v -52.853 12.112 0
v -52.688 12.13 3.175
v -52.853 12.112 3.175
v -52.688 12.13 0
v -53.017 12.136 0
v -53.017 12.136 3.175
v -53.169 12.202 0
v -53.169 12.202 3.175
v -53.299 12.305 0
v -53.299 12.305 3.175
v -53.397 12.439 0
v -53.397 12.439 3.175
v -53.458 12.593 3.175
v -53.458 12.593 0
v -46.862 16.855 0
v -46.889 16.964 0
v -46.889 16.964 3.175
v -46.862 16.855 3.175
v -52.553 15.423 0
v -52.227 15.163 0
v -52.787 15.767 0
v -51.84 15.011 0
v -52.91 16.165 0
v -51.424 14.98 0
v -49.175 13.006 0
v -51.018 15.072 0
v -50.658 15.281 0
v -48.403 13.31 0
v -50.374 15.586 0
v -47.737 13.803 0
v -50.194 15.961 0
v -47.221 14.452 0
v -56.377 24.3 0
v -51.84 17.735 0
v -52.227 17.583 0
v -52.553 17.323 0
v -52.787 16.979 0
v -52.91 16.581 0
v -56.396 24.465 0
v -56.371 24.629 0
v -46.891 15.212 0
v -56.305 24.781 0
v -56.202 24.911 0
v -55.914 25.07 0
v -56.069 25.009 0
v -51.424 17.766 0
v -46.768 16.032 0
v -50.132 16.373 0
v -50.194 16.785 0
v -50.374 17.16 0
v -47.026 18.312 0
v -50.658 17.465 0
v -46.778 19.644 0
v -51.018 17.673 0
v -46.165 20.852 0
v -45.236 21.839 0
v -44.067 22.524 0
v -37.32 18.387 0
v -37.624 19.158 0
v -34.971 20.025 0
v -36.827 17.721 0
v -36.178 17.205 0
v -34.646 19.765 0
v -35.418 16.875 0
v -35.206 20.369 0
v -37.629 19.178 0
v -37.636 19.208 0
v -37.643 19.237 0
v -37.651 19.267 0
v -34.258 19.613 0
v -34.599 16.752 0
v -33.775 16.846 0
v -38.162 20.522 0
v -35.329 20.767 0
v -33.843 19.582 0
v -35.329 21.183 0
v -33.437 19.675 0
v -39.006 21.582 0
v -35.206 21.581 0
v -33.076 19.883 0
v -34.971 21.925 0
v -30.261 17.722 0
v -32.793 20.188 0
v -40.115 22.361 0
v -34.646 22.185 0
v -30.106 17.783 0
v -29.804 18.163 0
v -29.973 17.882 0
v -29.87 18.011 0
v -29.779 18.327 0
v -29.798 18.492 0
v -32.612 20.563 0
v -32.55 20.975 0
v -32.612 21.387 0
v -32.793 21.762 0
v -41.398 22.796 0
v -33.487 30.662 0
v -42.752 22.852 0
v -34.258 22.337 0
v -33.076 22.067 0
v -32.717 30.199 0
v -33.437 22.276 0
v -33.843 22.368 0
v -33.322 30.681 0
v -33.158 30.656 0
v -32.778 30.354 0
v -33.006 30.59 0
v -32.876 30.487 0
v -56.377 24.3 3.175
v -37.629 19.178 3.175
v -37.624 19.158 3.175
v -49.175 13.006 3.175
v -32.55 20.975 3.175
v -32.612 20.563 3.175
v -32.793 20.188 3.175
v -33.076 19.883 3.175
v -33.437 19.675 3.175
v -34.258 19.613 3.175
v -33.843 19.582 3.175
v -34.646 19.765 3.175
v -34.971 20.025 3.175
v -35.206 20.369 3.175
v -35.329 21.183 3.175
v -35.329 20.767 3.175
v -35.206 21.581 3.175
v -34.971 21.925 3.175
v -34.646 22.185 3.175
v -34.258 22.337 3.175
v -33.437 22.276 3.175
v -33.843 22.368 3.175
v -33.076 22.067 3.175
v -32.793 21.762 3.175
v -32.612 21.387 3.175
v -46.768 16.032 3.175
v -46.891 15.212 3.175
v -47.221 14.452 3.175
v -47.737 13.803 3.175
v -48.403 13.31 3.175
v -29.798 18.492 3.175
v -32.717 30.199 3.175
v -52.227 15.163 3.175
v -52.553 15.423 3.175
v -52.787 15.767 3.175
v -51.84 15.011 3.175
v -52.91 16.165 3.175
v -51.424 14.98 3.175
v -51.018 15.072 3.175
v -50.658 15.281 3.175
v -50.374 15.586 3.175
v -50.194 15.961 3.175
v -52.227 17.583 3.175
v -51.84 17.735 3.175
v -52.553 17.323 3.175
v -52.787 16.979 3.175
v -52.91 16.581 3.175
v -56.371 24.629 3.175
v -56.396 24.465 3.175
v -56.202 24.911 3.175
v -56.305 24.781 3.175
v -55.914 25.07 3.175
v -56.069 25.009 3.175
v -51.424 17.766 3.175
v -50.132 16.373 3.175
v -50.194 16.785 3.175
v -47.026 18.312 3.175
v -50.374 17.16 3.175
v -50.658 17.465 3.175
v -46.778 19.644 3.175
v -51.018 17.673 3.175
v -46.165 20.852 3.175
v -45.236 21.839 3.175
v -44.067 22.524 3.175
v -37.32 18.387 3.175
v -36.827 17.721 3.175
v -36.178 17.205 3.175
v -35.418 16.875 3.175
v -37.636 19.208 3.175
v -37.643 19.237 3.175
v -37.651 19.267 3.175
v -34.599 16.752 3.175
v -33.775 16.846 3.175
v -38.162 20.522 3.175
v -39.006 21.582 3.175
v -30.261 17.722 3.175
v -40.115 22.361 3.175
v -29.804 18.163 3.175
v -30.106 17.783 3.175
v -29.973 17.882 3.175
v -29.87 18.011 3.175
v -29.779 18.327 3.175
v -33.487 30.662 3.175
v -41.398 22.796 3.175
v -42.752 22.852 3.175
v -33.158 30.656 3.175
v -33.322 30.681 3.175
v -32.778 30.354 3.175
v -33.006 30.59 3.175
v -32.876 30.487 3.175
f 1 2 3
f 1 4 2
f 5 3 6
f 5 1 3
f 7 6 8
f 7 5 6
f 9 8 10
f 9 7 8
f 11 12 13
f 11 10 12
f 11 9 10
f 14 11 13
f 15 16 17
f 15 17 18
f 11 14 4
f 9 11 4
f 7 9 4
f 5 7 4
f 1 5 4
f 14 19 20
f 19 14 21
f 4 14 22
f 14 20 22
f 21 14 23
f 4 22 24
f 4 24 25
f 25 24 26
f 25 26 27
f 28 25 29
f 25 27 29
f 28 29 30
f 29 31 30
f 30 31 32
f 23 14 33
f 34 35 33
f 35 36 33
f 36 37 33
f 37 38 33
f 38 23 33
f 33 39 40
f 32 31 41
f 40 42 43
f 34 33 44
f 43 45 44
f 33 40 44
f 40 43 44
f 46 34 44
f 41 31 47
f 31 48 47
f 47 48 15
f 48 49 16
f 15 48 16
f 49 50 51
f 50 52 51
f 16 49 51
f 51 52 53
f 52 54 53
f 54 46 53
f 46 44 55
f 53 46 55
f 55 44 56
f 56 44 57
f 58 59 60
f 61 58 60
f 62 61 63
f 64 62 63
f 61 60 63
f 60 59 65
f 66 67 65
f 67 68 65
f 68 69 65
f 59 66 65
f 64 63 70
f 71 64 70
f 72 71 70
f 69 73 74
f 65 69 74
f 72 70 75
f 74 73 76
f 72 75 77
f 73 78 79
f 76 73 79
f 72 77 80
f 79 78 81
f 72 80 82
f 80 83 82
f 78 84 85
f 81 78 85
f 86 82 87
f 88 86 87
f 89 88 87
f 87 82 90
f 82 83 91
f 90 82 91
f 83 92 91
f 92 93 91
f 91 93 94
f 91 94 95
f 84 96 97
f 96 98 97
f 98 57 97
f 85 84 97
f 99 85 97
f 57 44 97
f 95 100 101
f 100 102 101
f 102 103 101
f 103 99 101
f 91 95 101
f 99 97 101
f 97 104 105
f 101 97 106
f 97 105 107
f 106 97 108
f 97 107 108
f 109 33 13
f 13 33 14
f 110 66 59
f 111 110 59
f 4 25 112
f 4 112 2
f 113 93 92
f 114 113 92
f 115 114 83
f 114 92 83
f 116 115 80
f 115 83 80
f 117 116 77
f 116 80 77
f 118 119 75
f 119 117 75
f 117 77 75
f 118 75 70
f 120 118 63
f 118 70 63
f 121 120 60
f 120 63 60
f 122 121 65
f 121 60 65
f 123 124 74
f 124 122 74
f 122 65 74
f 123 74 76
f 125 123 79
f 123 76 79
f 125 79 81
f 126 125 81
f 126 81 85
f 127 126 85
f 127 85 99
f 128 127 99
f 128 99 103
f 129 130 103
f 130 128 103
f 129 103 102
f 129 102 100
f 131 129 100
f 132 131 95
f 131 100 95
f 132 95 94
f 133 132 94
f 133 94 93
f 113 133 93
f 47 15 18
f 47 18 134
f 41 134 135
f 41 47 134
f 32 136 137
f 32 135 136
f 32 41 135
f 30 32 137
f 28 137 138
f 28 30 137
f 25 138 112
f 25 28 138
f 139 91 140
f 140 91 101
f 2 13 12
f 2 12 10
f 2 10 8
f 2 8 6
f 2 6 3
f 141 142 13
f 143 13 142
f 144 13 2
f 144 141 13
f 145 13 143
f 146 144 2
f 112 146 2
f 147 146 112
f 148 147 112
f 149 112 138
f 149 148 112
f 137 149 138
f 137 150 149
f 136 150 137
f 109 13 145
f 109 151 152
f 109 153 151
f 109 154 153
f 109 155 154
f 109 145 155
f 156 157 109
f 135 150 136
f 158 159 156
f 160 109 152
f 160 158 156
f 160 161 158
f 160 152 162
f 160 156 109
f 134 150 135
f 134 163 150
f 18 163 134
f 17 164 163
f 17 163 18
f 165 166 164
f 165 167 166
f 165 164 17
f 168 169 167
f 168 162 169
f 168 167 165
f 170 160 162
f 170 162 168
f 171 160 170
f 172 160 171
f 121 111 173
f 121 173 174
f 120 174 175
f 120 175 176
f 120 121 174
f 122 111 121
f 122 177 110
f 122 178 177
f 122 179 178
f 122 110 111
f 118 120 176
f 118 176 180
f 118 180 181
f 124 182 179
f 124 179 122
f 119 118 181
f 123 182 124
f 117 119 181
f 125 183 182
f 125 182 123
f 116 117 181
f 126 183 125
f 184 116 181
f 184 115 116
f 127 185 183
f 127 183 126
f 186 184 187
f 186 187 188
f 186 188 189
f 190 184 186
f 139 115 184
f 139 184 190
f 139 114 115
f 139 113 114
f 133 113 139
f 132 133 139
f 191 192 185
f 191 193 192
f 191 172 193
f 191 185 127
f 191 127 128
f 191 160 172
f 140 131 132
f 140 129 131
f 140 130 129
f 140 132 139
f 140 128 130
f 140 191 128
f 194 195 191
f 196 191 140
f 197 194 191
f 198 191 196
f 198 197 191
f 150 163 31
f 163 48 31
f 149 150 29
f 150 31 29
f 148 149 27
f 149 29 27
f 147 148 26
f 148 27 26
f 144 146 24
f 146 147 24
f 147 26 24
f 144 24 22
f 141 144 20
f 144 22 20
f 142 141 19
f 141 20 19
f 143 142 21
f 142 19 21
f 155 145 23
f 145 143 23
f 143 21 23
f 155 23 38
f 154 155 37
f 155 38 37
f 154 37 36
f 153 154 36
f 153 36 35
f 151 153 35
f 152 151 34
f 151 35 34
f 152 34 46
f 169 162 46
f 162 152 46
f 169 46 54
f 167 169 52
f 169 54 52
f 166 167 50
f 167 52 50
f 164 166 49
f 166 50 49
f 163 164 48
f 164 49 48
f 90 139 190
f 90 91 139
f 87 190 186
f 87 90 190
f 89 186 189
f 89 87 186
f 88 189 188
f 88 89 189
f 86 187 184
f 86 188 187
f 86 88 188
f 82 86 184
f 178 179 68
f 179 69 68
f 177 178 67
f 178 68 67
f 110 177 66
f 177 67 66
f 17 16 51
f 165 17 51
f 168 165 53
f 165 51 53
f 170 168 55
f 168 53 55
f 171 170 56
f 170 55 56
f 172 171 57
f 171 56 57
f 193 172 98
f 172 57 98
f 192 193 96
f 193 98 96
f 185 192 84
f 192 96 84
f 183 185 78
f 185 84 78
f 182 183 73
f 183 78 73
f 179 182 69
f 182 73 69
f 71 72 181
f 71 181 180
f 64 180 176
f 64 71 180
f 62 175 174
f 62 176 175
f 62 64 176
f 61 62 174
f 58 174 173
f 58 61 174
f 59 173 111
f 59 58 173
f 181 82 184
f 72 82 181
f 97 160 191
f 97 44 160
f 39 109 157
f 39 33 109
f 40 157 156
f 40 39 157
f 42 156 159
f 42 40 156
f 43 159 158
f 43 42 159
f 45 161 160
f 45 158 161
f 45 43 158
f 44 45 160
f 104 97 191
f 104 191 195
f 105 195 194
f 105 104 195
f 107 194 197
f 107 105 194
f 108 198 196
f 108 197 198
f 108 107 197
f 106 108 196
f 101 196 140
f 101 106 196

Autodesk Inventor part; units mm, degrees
ref_plane "YZ Plane" through (0, 0, 0) normal (1, 0, 0) x (0, 1, 0)
ref_plane "XZ Plane" through (0, 0, 0) normal (0, 1, 0) x (-1, 0, 0)
ref_plane "XY Plane" through (0, 0, 0) normal (0, 0, 1) x (1, 0, 0)
ref_plane "Work Plane1" through (0, 0, 0) normal (0, 0, 1) x (1, 0, 0)
sketch "Sketch1" plane through (0, 0, 0) normal (0, 0, 1) x (1, 0, 0)
  circle A0 centre (-51.5287, 16.3728) radius 1.397 projected
  circle A1 centre (-33.9472, 20.9752) radius 1.397 projected
  line L0 (-56.5305, 24.9164) -> (-45.777, -18.2132) projected
  line L1 (-22.1173, -12.3142) -> (-32.8708, 30.8155) projected
  line L2 (-55.9143, 25.0701) -> (-33.4869, 30.6618)
  line L3 (-32.7171, 30.1993) -> (-29.7982, 18.4919)
  line L4 (-53.4579, 12.5929) -> (-56.3768, 24.3003)
  circle A2 centre (-42.2695, 18.1155) radius 1.5875 projected
  arc A3 (-37.6286, 19.1777) -> (-46.8891, 16.9637) centre (-42.2695, 18.1155) ccw
  line L5 (-42.2695, 18.1155) -> (-54.0994, 15.1659) construction
  line L6 (-46.8891, 16.9637) -> (-46.862, 16.8552)
  line L7 (-37.6509, 19.267) -> (-37.6238, 19.1585)
  line L8 (-30.2607, 17.7222) -> (-33.775, 16.8459)
  line L9 (-49.1746, 13.0064) -> (-52.6881, 12.1304)
  arc A4 (-49.1746, 13.0064) -> (-46.862, 16.8552) centre (-49.9427, 16.0871) ccw
  arc A5 (-37.6238, 19.1585) -> (-33.775, 16.8459) centre (-34.5431, 19.9266) ccw
  arc A6 (-55.9143, 25.0701) -> (-56.3768, 24.3003) centre (-55.7607, 24.4539) ccw
  arc A7 (-32.7171, 30.1993) -> (-33.4869, 30.6618) centre (-33.3333, 30.0457) ccw
  arc A8 (-53.4579, 12.5929) -> (-52.6881, 12.1304) centre (-52.8417, 12.7465) ccw
  arc A9 (-30.2607, 17.7222) -> (-29.7982, 18.4919) centre (-30.4143, 18.3383) ccw
  point P0 (0, 0)
  dimension "d0" = 3.175
  dimension "d1" = 0.635
  dimension "d2" = 0.635
extrude "Extrusion1" add sketch "Sketch1" along normal blind 3.175 contours A6 L2 A7 L1 A9 L8 A5 L7 A3 L6 A4 L9 A8 L0
properties part number "spacerBlock01" material "Wood (Maple)"
